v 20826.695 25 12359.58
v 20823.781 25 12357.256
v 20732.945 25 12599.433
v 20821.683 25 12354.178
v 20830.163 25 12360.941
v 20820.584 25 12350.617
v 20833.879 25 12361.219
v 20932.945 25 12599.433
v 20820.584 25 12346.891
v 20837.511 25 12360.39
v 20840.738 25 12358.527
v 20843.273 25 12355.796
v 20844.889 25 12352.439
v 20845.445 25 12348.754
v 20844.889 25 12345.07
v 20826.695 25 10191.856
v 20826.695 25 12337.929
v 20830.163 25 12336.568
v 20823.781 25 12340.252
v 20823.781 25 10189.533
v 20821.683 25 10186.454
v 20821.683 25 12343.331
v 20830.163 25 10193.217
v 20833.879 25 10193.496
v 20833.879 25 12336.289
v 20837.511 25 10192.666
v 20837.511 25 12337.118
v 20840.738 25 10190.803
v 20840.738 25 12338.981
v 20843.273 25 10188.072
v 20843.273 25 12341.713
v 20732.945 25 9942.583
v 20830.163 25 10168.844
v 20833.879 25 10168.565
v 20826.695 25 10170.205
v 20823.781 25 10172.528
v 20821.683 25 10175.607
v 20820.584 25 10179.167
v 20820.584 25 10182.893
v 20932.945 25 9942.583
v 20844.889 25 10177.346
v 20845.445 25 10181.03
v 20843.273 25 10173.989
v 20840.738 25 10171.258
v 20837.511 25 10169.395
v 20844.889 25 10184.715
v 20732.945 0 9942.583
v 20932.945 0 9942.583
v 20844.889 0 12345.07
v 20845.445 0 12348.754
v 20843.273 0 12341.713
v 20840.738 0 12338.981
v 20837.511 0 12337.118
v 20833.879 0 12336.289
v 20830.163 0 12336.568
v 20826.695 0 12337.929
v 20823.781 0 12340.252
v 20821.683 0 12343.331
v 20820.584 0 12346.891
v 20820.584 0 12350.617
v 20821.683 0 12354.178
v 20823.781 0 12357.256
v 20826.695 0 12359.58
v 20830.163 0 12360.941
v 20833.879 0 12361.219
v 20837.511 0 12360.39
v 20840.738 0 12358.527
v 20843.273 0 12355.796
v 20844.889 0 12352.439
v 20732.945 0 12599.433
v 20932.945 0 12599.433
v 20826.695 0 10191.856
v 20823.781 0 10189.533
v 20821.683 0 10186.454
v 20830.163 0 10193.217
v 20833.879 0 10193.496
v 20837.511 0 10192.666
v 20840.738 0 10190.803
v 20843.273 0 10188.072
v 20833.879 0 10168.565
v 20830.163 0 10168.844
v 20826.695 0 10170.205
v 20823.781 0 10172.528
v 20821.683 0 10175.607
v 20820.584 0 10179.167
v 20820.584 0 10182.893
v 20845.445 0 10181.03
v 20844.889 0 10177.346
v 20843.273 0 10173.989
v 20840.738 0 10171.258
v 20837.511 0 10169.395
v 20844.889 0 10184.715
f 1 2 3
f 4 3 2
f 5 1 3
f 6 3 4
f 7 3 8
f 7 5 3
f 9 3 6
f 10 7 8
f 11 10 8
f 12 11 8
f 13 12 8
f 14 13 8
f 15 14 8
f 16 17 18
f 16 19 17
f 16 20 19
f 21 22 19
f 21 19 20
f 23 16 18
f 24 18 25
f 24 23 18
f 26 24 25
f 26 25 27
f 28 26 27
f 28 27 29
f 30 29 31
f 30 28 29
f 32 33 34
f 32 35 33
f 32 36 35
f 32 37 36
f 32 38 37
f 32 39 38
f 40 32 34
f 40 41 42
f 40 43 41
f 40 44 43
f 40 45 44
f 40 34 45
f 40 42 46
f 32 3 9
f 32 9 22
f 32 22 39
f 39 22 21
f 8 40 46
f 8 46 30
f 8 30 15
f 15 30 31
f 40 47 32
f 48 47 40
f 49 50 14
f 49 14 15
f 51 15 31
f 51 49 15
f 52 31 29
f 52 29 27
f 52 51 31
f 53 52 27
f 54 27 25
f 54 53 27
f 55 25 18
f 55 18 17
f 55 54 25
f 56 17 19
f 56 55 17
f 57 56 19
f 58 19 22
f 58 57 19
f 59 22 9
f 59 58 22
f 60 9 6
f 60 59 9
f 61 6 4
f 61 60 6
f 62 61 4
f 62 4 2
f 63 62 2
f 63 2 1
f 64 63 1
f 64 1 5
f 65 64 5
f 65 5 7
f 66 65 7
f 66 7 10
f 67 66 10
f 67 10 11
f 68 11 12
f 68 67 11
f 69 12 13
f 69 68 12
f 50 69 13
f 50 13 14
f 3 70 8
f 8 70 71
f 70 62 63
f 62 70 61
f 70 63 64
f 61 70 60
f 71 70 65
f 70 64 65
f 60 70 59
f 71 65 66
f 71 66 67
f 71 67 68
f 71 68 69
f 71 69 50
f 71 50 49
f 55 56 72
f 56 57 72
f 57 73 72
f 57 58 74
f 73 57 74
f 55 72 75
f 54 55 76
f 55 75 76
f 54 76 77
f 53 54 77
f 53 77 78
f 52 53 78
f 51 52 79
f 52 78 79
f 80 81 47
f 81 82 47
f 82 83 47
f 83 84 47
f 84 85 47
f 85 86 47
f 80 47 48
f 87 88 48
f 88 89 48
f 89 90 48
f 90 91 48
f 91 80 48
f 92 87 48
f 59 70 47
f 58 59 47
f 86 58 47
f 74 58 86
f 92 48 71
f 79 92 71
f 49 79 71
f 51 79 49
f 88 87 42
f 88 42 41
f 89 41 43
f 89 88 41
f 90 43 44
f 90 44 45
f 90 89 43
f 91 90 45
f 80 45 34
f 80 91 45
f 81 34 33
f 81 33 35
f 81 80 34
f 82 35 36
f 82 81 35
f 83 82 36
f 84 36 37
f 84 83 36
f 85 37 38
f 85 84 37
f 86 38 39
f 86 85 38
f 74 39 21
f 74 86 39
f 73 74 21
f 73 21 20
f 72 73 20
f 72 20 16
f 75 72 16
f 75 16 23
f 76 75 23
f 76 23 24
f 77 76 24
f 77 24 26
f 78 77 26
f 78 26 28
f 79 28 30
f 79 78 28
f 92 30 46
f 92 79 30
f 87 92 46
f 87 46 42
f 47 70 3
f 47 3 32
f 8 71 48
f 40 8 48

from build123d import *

# Parameters (mm, degrees)
SKETCH4_W             = 200
SKETCH4_H             = 2933.573874127
SKETCH4_R             = 12.5
BOSS_EXTRUDE1_DEPTH   = 25
SKETCH4_H_2           = 2891.000919938
BOSS_EXTRUDE1_2_DEPTH = 25
SKETCH4_H_3           = 2656.8496719
BOSS_EXTRUDE1_3_DEPTH = 25
SKETCH4_H_4           = 2167.26069873
BOSS_EXTRUDE1_4_DEPTH = 25
SKETCH4_H_5           = 1693.636583381
BOSS_EXTRUDE1_5_DEPTH = 25
SKETCH5_W             = 2238.390785376
SKETCH5_H             = 5234.661915406
SKETCH5_W_2           = 2449.892276907
SKETCH5_H_2           = 4952.659926697
CUT_EXTRUDE1_DEPTH    = 26


with BuildPart() as part:
    # Sketch4 → Boss-Extrude1 (new body)
    with BuildSketch(Plane(origin=(0, 0, 0), x_dir=(1, 0, 0), z_dir=(0, 1, 0))):
        with Locations((23132.944645813, -11409.369811035)):
            Rectangle(SKETCH4_W, SKETCH4_H)
        with Locations((23132.944645813, -12678.089615367)):
            Circle(SKETCH4_R, mode=Mode.SUBTRACT)
        with Locations((23132.944645813, -10181.030459334)):
            Circle(SKETCH4_R, mode=Mode.SUBTRACT)
    extrude(amount=BOSS_EXTRUDE1_DEPTH)


with BuildPart() as body_2:
    # Sketch4 → Boss-Extrude1 2 (new body)
    with BuildSketch(Plane(origin=(0, 0, 0), x_dir=(1, 0, 0), z_dir=(0, 1, 0))):
        with Locations((22032.944645813, -11388.083333941)):
            Rectangle(SKETCH4_W, SKETCH4_H_2)
        with Locations((22032.944645813, -12621.228285175)):
            Circle(SKETCH4_R, mode=Mode.SUBTRACT)
        with Locations((22032.944645813, -10181.030459334)):
            Circle(SKETCH4_R, mode=Mode.SUBTRACT)
    extrude(amount=BOSS_EXTRUDE1_2_DEPTH)


with BuildPart() as body_3:
    # Sketch4 → Boss-Extrude1 3 (new body)
    with BuildSketch(Plane(origin=(0, 0, 0), x_dir=(1, 0, 0), z_dir=(0, 1, 0))):
        with Locations((20832.944645813, -11271.007709922)):
            Rectangle(SKETCH4_W, SKETCH4_H_3)
        with Locations((20832.944645813, -12348.754240871)):
            Circle(SKETCH4_R, mode=Mode.SUBTRACT)
        with Locations((20832.944645813, -10181.030459334)):
            Circle(SKETCH4_R, mode=Mode.SUBTRACT)
    extrude(amount=BOSS_EXTRUDE1_3_DEPTH)


with BuildPart() as body_4:
    # Sketch4 → Boss-Extrude1 4 (new body)
    with BuildSketch(Plane(origin=(0, 0, 0), x_dir=(1, 0, 0), z_dir=(0, 1, 0))):
        with Locations((19632.944645813, -11026.213223337)):
            Rectangle(SKETCH4_W, SKETCH4_H_4)
        with Locations((19632.944645813, -11826.915448153)):
            Circle(SKETCH4_R, mode=Mode.SUBTRACT)
        with Locations((19632.944645813, -10181.030459334)):
            Circle(SKETCH4_R, mode=Mode.SUBTRACT)
    extrude(amount=BOSS_EXTRUDE1_4_DEPTH)


with BuildPart() as body_5:
    # Sketch4 → Boss-Extrude1 5 (new body)
    with BuildSketch(Plane(origin=(0, 0, 0), x_dir=(1, 0, 0), z_dir=(0, 1, 0))):
        with Locations((18802.944645813, -10789.401165663)):
            Rectangle(SKETCH4_W, SKETCH4_H_5)
        with Locations((18802.944645813, -11283.669778774)):
            Circle(SKETCH4_R, mode=Mode.SUBTRACT)
        with Locations((18802.944645813, -10181.030459334)):
            Circle(SKETCH4_R, mode=Mode.SUBTRACT)
    extrude(amount=BOSS_EXTRUDE1_5_DEPTH)


with BuildPart() as cut_extrude1_tool:
    # Sketch5 → Cut-Extrude1 (new body, through all)
    with BuildSketch(Plane(origin=(0, 0, 0), x_dir=(1, 0, 0), z_dir=(0, 1, 0))):
        with Locations((22792.145010273, -11127.367822327)):
            Rectangle(SKETCH5_W, SKETCH5_H)
        with Locations((18879.36741694, -11479.870308213)):
            Rectangle(SKETCH5_W_2, SKETCH5_H_2)
    extrude(amount=CUT_EXTRUDE1_DEPTH)


with BuildPart() as part_1:
    add(part.part)

    # Cut-Extrude1: cut by cut_extrude1_tool
    add(cut_extrude1_tool.part, mode=Mode.SUBTRACT)


with BuildPart() as body_2_1:
    add(body_2.part)

    # Cut-Extrude1: cut by cut_extrude1_tool
    add(cut_extrude1_tool.part, mode=Mode.SUBTRACT)


with BuildPart() as body_4_1:
    add(body_4.part)

    # Cut-Extrude1: cut by cut_extrude1_tool
    add(cut_extrude1_tool.part, mode=Mode.SUBTRACT)


with BuildPart() as body_5_1:
    add(body_5.part)

    # Cut-Extrude1: cut by cut_extrude1_tool
    add(cut_extrude1_tool.part, mode=Mode.SUBTRACT)


solid = body_3.part
